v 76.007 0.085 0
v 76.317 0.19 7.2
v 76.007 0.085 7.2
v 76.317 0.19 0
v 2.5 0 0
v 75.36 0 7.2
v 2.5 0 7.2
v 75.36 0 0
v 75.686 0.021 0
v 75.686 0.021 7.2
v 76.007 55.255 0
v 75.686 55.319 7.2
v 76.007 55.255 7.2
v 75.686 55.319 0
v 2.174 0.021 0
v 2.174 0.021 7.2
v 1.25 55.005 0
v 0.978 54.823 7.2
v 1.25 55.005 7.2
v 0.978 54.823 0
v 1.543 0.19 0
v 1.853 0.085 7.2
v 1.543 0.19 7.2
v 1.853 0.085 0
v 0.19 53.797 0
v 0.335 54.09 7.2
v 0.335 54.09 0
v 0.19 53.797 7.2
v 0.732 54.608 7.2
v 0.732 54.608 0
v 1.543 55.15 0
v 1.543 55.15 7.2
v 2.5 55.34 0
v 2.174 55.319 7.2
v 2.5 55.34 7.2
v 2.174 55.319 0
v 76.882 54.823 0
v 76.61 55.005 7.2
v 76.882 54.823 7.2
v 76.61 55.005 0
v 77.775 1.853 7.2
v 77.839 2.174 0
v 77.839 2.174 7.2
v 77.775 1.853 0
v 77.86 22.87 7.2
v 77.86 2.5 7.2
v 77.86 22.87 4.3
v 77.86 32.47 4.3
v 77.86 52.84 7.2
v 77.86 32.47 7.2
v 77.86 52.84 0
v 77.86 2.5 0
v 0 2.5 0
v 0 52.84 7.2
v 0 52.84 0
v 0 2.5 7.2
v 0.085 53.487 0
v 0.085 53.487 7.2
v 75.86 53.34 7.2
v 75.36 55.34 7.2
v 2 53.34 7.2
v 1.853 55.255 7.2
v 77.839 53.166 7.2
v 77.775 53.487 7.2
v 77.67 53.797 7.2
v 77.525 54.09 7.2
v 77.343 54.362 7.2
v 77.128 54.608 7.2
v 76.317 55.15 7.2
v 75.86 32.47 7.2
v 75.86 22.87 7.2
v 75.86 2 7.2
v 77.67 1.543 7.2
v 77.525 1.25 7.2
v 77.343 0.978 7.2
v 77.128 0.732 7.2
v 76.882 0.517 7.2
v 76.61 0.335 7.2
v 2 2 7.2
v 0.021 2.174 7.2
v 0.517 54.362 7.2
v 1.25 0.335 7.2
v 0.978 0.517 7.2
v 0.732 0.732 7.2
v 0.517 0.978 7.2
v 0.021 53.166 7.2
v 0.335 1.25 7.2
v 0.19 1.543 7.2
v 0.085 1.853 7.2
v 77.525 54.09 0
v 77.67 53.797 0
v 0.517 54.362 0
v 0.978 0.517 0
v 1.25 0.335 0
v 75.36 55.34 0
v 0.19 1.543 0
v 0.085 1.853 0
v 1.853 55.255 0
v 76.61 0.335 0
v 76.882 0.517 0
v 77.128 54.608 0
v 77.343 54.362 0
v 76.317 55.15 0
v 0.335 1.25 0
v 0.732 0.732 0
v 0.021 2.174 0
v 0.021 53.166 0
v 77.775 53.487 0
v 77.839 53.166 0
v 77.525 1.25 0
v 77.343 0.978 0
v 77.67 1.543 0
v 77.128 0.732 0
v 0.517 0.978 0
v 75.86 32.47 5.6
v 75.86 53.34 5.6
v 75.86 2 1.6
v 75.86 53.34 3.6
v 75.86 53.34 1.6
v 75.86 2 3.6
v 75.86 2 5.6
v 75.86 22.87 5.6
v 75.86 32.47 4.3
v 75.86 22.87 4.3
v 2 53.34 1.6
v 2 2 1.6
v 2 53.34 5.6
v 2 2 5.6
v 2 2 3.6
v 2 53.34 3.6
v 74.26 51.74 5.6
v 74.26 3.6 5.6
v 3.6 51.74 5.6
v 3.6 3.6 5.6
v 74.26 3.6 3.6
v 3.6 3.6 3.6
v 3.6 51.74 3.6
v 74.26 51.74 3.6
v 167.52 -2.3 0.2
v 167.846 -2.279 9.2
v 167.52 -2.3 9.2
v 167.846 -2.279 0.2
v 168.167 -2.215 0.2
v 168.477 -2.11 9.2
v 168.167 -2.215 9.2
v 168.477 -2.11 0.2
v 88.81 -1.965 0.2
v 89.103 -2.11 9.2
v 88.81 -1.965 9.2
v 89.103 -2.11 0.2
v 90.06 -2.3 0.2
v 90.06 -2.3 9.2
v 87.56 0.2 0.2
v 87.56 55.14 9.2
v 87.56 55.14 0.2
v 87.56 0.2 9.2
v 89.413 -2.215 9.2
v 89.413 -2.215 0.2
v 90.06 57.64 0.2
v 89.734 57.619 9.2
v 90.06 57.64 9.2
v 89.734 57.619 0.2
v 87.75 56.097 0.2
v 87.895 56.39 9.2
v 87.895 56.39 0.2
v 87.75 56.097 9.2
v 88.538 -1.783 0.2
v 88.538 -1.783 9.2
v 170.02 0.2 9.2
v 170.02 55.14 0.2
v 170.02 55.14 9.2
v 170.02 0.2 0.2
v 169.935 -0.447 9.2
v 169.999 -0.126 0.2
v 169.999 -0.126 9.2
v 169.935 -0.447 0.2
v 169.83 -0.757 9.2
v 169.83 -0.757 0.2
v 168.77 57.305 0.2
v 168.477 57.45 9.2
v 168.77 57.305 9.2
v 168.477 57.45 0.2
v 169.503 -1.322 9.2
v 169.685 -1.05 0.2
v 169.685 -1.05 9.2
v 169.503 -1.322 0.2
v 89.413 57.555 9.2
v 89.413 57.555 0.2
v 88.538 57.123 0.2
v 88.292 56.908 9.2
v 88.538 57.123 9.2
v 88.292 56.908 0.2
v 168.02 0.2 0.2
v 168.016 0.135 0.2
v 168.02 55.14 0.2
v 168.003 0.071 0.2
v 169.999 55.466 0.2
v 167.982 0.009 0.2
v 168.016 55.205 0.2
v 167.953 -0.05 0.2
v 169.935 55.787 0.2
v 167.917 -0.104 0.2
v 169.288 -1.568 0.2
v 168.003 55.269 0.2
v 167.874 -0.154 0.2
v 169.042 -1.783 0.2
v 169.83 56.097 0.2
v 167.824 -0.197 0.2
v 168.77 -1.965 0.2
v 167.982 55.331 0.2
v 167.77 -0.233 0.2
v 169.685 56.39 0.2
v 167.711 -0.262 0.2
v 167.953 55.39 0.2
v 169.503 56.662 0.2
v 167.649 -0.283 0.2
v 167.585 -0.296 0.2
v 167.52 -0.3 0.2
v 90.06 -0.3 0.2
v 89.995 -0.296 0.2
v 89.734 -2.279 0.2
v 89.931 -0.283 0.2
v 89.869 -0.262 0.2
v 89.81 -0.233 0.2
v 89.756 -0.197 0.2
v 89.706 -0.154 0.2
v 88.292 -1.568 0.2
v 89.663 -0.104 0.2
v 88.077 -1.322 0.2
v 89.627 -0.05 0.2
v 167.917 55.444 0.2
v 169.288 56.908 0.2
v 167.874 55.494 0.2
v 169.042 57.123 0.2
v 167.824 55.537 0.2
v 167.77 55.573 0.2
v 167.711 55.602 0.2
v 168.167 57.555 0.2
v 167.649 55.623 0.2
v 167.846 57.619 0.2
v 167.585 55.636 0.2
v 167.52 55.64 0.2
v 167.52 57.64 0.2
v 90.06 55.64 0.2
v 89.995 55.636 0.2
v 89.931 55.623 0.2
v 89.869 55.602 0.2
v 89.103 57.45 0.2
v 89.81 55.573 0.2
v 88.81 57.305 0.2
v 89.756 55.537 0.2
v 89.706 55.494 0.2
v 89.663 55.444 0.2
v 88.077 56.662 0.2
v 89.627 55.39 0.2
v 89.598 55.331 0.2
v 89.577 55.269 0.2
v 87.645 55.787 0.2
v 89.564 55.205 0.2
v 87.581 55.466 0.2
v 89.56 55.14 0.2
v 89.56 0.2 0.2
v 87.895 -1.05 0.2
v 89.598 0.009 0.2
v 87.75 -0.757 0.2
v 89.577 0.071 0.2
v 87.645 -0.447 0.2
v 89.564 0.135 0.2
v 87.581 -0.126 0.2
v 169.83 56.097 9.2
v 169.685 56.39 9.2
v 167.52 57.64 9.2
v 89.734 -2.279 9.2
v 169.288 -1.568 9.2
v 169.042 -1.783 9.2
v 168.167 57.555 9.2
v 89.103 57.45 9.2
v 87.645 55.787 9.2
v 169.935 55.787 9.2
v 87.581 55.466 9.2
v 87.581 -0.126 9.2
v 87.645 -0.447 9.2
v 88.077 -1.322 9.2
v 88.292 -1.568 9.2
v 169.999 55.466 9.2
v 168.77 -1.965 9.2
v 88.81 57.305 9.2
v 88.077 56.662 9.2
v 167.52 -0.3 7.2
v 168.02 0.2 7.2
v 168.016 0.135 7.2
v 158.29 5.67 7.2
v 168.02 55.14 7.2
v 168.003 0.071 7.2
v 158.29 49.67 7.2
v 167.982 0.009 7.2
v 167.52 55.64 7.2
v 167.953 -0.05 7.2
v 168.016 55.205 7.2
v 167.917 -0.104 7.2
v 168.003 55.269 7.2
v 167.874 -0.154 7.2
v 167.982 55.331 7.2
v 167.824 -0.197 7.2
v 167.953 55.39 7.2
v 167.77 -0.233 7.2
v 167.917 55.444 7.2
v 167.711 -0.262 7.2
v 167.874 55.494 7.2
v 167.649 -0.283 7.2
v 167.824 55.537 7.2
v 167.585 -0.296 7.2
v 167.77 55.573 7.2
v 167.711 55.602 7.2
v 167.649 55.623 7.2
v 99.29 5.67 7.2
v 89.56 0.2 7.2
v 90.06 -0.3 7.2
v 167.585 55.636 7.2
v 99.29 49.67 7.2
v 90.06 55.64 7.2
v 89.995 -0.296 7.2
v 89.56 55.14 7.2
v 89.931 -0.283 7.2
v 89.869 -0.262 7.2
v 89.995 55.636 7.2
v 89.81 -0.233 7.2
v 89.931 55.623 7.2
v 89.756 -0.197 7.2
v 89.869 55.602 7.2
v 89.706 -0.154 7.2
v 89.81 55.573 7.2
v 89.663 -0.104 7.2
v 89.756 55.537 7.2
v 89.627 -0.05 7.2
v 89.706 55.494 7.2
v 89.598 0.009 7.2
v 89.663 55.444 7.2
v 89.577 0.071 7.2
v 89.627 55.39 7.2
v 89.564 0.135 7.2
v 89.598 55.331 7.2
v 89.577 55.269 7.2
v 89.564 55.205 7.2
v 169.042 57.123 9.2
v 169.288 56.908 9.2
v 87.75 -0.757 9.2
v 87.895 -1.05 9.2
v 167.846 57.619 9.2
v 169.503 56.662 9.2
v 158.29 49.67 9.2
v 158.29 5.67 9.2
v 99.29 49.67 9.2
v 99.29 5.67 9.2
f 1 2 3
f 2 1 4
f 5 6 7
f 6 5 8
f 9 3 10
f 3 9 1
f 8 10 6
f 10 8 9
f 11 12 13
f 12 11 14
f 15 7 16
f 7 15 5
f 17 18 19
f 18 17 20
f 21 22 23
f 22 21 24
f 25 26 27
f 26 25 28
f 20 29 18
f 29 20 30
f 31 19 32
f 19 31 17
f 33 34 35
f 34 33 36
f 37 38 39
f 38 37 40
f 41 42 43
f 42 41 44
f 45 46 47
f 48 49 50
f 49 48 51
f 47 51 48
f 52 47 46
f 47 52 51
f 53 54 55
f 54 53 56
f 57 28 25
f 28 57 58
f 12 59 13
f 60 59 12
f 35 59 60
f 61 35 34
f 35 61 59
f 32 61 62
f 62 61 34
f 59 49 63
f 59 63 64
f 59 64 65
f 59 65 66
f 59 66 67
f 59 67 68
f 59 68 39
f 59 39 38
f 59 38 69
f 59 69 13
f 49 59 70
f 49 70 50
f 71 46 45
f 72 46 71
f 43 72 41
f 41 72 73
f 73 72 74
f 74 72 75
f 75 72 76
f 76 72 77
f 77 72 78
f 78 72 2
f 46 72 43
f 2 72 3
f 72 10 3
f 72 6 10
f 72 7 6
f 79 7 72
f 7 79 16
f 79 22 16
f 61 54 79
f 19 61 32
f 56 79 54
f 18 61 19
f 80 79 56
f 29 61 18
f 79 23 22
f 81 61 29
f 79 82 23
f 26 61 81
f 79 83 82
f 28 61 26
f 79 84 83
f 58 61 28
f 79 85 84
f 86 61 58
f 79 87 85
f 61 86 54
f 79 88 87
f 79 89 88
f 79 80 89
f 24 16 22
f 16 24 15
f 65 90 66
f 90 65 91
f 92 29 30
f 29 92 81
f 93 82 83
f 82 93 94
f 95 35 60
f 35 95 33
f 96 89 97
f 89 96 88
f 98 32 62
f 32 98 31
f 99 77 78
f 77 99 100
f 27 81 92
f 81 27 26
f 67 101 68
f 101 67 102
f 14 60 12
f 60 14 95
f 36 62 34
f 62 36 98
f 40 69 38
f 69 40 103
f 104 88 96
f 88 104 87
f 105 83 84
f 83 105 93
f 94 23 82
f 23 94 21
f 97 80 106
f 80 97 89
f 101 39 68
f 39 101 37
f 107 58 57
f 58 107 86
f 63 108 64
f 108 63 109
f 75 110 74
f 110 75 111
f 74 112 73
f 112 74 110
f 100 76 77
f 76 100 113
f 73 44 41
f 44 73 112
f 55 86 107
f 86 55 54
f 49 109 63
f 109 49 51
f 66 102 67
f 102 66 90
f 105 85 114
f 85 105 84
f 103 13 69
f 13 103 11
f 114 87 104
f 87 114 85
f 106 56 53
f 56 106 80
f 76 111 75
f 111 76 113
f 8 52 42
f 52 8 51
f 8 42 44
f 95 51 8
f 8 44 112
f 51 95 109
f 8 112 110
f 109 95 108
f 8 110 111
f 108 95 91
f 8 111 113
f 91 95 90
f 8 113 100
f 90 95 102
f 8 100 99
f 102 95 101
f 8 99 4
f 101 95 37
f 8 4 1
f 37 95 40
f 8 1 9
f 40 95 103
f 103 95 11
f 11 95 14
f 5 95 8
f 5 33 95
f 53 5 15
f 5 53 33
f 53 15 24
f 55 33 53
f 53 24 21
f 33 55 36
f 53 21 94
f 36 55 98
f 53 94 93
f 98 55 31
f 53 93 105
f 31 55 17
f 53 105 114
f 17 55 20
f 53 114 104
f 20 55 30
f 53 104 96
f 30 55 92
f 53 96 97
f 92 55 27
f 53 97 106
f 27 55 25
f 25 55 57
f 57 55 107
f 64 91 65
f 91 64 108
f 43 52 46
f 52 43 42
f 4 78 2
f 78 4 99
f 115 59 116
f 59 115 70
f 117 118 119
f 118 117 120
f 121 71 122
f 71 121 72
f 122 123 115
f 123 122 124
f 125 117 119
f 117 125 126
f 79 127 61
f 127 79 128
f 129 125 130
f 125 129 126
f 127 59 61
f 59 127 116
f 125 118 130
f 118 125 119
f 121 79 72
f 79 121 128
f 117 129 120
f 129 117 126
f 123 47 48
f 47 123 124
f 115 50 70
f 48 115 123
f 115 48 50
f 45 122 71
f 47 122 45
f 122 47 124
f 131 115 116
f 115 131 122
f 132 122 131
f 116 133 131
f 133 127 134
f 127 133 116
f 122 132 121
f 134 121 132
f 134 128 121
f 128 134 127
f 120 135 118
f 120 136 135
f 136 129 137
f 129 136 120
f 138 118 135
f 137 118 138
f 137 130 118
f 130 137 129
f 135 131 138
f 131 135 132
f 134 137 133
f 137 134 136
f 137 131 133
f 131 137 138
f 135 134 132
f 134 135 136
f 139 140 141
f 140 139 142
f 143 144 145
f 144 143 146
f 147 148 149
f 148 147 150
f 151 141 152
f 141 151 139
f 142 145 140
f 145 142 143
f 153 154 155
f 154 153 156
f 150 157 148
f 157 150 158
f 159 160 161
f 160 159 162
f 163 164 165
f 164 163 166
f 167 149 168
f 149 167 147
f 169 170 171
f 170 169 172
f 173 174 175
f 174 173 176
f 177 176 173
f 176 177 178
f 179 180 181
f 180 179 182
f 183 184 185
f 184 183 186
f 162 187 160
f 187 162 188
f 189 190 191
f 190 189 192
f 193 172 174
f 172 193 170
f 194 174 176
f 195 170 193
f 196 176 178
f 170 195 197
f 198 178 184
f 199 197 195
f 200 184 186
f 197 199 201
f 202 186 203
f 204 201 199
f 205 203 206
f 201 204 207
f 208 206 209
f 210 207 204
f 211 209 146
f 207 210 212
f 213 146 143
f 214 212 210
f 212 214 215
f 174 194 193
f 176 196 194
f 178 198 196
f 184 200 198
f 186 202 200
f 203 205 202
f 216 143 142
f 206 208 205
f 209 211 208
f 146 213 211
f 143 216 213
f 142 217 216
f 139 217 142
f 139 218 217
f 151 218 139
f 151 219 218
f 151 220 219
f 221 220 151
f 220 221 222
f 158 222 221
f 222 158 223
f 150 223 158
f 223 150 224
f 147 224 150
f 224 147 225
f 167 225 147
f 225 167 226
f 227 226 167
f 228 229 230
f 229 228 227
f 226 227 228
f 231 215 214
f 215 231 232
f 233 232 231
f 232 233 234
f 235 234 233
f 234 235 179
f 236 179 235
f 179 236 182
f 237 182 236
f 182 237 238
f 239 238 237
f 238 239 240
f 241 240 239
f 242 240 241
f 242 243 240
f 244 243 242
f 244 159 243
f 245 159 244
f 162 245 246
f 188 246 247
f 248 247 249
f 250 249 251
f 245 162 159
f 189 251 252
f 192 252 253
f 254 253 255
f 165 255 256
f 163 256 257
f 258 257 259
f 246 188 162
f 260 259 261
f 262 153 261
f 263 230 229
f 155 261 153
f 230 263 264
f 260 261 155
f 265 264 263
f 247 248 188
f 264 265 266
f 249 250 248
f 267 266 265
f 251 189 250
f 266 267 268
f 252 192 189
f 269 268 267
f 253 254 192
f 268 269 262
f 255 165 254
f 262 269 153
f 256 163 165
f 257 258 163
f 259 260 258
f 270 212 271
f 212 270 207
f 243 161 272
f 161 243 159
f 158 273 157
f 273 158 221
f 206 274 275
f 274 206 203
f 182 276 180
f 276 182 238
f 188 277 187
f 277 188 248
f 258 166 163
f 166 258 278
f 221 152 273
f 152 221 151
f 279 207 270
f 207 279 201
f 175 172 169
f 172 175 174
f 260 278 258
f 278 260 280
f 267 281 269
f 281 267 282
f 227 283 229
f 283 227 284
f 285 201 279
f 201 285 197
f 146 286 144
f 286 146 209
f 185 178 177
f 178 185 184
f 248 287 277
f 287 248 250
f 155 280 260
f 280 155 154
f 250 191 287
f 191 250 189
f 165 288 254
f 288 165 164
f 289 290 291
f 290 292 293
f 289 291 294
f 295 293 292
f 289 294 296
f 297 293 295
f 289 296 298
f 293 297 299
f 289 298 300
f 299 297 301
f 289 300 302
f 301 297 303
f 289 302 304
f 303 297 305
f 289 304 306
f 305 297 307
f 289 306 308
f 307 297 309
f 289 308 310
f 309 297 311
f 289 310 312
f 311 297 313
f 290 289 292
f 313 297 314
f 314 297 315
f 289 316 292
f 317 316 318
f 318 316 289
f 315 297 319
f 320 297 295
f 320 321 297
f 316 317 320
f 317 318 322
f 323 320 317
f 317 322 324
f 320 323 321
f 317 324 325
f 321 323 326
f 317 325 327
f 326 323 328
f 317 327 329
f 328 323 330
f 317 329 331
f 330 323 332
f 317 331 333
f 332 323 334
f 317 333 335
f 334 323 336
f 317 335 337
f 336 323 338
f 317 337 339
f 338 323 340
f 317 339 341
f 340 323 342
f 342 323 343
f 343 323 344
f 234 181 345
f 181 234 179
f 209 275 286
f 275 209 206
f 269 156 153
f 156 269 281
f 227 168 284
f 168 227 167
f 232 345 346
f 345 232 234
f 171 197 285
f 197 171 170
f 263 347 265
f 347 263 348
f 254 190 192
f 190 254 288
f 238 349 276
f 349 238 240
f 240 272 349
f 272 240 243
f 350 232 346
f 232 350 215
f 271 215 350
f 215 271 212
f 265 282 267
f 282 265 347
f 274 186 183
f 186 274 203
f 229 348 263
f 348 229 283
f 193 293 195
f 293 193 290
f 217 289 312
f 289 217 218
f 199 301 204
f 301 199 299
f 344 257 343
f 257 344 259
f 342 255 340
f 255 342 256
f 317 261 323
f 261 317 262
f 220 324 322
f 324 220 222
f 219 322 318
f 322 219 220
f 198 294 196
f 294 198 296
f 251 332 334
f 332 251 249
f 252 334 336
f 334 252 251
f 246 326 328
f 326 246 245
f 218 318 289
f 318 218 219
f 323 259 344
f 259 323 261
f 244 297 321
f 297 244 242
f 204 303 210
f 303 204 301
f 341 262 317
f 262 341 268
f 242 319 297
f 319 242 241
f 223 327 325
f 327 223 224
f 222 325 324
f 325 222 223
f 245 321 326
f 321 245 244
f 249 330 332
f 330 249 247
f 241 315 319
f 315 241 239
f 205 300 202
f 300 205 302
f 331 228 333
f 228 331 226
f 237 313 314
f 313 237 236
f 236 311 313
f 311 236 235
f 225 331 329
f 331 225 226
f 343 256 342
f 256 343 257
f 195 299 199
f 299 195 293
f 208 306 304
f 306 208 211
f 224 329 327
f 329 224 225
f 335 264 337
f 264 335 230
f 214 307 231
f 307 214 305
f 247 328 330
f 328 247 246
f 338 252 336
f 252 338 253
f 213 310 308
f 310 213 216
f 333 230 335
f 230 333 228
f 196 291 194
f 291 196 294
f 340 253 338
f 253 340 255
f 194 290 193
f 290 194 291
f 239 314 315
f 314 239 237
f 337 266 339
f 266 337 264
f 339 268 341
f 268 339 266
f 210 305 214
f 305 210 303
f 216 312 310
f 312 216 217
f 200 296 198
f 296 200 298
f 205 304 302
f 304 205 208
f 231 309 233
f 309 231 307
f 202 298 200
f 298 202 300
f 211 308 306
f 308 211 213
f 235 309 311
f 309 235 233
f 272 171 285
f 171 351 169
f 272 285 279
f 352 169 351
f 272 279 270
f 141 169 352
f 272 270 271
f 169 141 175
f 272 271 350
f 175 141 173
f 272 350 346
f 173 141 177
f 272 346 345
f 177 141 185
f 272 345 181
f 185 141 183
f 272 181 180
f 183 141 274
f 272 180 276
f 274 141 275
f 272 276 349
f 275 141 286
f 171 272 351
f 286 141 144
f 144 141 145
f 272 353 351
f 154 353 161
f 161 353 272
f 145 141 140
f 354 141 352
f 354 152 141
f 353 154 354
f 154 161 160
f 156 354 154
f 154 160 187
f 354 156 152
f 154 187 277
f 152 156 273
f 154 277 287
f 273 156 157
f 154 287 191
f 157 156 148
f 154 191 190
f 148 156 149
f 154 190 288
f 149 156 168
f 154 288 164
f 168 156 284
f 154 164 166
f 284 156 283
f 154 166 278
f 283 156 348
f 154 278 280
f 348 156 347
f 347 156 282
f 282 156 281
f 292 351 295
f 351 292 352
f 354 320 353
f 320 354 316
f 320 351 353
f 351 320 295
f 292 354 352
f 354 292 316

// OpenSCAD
// =============================================================================
// RuuviBeacon case — Waveshare ESP32-S3-Touch-LCD-2.8 (no battery)
// Two-part friction-fit enclosure: back tray (cradles the PCB by its edges)
// + front bezel (window for the screen, skirt slips over the tray).
//
// Board outer size 73.06 x 50.54 mm is from Waveshare's docs. Everything else
// (component heights, screen-window position, USB-C location) is NOT published,
// so the values below are reasonable estimates. >>> MEASURE the ones marked
// (MEASURE) against your board with calipers and adjust before printing. <<<
//
// Render parts:  openscad -D 'part="back"'  -o back.stl  ruuvibeacon_case.scad
//                openscad -D 'part="bezel"' -o bezel.stl ruuvibeacon_case.scad
// part="both" (default) shows them side by side for preview.
// =============================================================================

part = "both";          // "back" | "bezel" | "both"
$fn = 48;

// ---- board ----
board_w   = 73.06;      // long edge (X)
board_h   = 50.54;      // short edge (Y)
pcb_th    = 1.6;        // PCB thickness
back_clear= 4.0;        // (MEASURE) clearance under PCB for back-side components
front_clear=3.2;        // (MEASURE) height the glass/touch panel stands above the PCB front

// ---- shell ----
wall      = 2.0;        // wall thickness
floor_th  = 1.6;        // back floor thickness
fit       = 0.4;        // gap around the PCB inside the tray
ledge_w   = 1.6;        // width of the rim the PCB rests on
corner_r  = 2.5;        // outer corner radius

// ---- bezel ----
bezel_th    = 2.0;      // thickness of the front face
bezel_border= 3.0;      // how much the bezel overlaps the PCB front edge (holds it down)
skirt_h     = 7.0;      // how far the bezel skirt slides over the tray
skirt_gap   = 0.30;     // friction-fit clearance between skirt and tray

// ---- screen window (MEASURE: active glass rectangle + its position) ----
// active area of a 2.8" 240x320 panel ~ 43.2 x 57.6 mm; +reveal for the bezel opening
screen_w     = 44.0;    // window size across the SHORT axis (Y)
screen_h     = 59.0;    // window size along the LONG axis (X)
screen_off_x = 0.0;     // shift window along X from board centre (+ toward USB edge)
screen_off_y = 0.0;     // shift window along Y from board centre

// ---- USB-C cutout (MEASURE: edge + offset). Default: +X short edge, centred ----
usb_w        = 9.6;     // cutout width
usb_h        = 4.2;     // cutout height
usb_off      = 0.0;     // offset along the edge from centre
usb_edge     = "x+";    // "x+","x-","y+","y-"  which edge the USB-C is on

// ---- derived ----
cav_w = board_w + 2*fit;
cav_h = board_h + 2*fit;
out_w = cav_w + 2*wall;
out_h = cav_h + 2*wall;
pcb_bottom_z = floor_th + back_clear;          // PCB rests here
pcb_top_z    = pcb_bottom_z + pcb_th;
tray_top_z   = pcb_top_z;                        // tray walls end flush with PCB front

// rounded box helper (flat-bottom prism with rounded vertical edges)
module rbox(w, h, z, r) {
  linear_extrude(z)
    offset(r=r) offset(r=-r) square([w, h]);
}

// ---------------------------------------------------------------- BACK TRAY
module back_shell() {
  difference() {
    rbox(out_w, out_h, tray_top_z, corner_r);                 // solid block
    // component + PCB cavity (hollow from the floor up to the top)
    translate([wall, wall, floor_th])
      cube([cav_w, cav_h, tray_top_z]);                       // full-height void
    usb_cutout();                                             // USB-C slot
  }
  // PCB rest ledge: a thin rim protruding inward; the PCB sits on its top face
  difference() {
    translate([wall, wall, pcb_bottom_z - ledge_h()])
      cube([cav_w, cav_h, ledge_h()]);
    translate([wall+ledge_w, wall+ledge_w, pcb_bottom_z - ledge_h() - 0.1])
      cube([cav_w-2*ledge_w, cav_h-2*ledge_w, ledge_h()+0.2]);
  }
}
function ledge_h() = min(2.0, back_clear);   // ledge height (don't exceed cavity)

module usb_cutout() {
  // a slot through the wall at PCB level, on the chosen edge
  z = pcb_bottom_z + pcb_th/2;
  ex = 4*wall;                                  // make sure it punches through
  if (usb_edge == "x+")
    translate([out_w - wall - 0.1, out_h/2 + usb_off - usb_w/2, z - usb_h/2])
      cube([wall+ex, usb_w, usb_h]);
  else if (usb_edge == "x-")
    translate([-ex+0.1, out_h/2 + usb_off - usb_w/2, z - usb_h/2])
      cube([wall+ex, usb_w, usb_h]);
  else if (usb_edge == "y+")
    translate([out_w/2 + usb_off - usb_w/2, out_h - wall - 0.1, z - usb_h/2])
      cube([usb_w, wall+ex, usb_h]);
  else // y-
    translate([out_w/2 + usb_off - usb_w/2, -ex+0.1, z - usb_h/2])
      cube([usb_w, wall+ex, usb_h]);
}

// ---------------------------------------------------------------- FRONT BEZEL
module front_bezel() {
  bz_out_w = out_w + 2*skirt_gap + 2*wall;
  bz_out_h = out_h + 2*skirt_gap + 2*wall;
  // front face plate sits on top of the tray (z = tray_top_z), window cut out
  translate([-(wall+skirt_gap), -(wall+skirt_gap), 0]) {
    difference() {
      union() {
        // top frame plate
        translate([0,0, tray_top_z])
          rbox(bz_out_w, bz_out_h, bezel_th, corner_r);
        // skirt going down over the tray outside
        difference() {
          translate([0,0, tray_top_z - skirt_h])
            rbox(bz_out_w, bz_out_h, skirt_h, corner_r);
          translate([wall, wall, tray_top_z - skirt_h - 0.1])
            rbox(bz_out_w-2*wall, bz_out_h-2*wall, skirt_h+0.2, max(0.1,corner_r-wall));
        }
      }
      // screen window through the plate (sized to the glass, minus bezel_border overlap)
      wx = screen_h;   // along X (long axis)
      wy = screen_w;   // along Y (short axis)
      cx = (wall+skirt_gap) + out_w/2 + screen_off_x;
      cy = (wall+skirt_gap) + out_h/2 + screen_off_y;
      translate([cx - wx/2, cy - wy/2, tray_top_z - 0.1])
        cube([wx, wy, bezel_th + 0.2]);
    }
  }
}

// ---------------------------------------------------------------- LAYOUT
if (part == "back")       back_shell();
else if (part == "bezel") front_bezel();
else {
  back_shell();
  translate([out_w + 12, 0, 0]) front_bezel();
}
